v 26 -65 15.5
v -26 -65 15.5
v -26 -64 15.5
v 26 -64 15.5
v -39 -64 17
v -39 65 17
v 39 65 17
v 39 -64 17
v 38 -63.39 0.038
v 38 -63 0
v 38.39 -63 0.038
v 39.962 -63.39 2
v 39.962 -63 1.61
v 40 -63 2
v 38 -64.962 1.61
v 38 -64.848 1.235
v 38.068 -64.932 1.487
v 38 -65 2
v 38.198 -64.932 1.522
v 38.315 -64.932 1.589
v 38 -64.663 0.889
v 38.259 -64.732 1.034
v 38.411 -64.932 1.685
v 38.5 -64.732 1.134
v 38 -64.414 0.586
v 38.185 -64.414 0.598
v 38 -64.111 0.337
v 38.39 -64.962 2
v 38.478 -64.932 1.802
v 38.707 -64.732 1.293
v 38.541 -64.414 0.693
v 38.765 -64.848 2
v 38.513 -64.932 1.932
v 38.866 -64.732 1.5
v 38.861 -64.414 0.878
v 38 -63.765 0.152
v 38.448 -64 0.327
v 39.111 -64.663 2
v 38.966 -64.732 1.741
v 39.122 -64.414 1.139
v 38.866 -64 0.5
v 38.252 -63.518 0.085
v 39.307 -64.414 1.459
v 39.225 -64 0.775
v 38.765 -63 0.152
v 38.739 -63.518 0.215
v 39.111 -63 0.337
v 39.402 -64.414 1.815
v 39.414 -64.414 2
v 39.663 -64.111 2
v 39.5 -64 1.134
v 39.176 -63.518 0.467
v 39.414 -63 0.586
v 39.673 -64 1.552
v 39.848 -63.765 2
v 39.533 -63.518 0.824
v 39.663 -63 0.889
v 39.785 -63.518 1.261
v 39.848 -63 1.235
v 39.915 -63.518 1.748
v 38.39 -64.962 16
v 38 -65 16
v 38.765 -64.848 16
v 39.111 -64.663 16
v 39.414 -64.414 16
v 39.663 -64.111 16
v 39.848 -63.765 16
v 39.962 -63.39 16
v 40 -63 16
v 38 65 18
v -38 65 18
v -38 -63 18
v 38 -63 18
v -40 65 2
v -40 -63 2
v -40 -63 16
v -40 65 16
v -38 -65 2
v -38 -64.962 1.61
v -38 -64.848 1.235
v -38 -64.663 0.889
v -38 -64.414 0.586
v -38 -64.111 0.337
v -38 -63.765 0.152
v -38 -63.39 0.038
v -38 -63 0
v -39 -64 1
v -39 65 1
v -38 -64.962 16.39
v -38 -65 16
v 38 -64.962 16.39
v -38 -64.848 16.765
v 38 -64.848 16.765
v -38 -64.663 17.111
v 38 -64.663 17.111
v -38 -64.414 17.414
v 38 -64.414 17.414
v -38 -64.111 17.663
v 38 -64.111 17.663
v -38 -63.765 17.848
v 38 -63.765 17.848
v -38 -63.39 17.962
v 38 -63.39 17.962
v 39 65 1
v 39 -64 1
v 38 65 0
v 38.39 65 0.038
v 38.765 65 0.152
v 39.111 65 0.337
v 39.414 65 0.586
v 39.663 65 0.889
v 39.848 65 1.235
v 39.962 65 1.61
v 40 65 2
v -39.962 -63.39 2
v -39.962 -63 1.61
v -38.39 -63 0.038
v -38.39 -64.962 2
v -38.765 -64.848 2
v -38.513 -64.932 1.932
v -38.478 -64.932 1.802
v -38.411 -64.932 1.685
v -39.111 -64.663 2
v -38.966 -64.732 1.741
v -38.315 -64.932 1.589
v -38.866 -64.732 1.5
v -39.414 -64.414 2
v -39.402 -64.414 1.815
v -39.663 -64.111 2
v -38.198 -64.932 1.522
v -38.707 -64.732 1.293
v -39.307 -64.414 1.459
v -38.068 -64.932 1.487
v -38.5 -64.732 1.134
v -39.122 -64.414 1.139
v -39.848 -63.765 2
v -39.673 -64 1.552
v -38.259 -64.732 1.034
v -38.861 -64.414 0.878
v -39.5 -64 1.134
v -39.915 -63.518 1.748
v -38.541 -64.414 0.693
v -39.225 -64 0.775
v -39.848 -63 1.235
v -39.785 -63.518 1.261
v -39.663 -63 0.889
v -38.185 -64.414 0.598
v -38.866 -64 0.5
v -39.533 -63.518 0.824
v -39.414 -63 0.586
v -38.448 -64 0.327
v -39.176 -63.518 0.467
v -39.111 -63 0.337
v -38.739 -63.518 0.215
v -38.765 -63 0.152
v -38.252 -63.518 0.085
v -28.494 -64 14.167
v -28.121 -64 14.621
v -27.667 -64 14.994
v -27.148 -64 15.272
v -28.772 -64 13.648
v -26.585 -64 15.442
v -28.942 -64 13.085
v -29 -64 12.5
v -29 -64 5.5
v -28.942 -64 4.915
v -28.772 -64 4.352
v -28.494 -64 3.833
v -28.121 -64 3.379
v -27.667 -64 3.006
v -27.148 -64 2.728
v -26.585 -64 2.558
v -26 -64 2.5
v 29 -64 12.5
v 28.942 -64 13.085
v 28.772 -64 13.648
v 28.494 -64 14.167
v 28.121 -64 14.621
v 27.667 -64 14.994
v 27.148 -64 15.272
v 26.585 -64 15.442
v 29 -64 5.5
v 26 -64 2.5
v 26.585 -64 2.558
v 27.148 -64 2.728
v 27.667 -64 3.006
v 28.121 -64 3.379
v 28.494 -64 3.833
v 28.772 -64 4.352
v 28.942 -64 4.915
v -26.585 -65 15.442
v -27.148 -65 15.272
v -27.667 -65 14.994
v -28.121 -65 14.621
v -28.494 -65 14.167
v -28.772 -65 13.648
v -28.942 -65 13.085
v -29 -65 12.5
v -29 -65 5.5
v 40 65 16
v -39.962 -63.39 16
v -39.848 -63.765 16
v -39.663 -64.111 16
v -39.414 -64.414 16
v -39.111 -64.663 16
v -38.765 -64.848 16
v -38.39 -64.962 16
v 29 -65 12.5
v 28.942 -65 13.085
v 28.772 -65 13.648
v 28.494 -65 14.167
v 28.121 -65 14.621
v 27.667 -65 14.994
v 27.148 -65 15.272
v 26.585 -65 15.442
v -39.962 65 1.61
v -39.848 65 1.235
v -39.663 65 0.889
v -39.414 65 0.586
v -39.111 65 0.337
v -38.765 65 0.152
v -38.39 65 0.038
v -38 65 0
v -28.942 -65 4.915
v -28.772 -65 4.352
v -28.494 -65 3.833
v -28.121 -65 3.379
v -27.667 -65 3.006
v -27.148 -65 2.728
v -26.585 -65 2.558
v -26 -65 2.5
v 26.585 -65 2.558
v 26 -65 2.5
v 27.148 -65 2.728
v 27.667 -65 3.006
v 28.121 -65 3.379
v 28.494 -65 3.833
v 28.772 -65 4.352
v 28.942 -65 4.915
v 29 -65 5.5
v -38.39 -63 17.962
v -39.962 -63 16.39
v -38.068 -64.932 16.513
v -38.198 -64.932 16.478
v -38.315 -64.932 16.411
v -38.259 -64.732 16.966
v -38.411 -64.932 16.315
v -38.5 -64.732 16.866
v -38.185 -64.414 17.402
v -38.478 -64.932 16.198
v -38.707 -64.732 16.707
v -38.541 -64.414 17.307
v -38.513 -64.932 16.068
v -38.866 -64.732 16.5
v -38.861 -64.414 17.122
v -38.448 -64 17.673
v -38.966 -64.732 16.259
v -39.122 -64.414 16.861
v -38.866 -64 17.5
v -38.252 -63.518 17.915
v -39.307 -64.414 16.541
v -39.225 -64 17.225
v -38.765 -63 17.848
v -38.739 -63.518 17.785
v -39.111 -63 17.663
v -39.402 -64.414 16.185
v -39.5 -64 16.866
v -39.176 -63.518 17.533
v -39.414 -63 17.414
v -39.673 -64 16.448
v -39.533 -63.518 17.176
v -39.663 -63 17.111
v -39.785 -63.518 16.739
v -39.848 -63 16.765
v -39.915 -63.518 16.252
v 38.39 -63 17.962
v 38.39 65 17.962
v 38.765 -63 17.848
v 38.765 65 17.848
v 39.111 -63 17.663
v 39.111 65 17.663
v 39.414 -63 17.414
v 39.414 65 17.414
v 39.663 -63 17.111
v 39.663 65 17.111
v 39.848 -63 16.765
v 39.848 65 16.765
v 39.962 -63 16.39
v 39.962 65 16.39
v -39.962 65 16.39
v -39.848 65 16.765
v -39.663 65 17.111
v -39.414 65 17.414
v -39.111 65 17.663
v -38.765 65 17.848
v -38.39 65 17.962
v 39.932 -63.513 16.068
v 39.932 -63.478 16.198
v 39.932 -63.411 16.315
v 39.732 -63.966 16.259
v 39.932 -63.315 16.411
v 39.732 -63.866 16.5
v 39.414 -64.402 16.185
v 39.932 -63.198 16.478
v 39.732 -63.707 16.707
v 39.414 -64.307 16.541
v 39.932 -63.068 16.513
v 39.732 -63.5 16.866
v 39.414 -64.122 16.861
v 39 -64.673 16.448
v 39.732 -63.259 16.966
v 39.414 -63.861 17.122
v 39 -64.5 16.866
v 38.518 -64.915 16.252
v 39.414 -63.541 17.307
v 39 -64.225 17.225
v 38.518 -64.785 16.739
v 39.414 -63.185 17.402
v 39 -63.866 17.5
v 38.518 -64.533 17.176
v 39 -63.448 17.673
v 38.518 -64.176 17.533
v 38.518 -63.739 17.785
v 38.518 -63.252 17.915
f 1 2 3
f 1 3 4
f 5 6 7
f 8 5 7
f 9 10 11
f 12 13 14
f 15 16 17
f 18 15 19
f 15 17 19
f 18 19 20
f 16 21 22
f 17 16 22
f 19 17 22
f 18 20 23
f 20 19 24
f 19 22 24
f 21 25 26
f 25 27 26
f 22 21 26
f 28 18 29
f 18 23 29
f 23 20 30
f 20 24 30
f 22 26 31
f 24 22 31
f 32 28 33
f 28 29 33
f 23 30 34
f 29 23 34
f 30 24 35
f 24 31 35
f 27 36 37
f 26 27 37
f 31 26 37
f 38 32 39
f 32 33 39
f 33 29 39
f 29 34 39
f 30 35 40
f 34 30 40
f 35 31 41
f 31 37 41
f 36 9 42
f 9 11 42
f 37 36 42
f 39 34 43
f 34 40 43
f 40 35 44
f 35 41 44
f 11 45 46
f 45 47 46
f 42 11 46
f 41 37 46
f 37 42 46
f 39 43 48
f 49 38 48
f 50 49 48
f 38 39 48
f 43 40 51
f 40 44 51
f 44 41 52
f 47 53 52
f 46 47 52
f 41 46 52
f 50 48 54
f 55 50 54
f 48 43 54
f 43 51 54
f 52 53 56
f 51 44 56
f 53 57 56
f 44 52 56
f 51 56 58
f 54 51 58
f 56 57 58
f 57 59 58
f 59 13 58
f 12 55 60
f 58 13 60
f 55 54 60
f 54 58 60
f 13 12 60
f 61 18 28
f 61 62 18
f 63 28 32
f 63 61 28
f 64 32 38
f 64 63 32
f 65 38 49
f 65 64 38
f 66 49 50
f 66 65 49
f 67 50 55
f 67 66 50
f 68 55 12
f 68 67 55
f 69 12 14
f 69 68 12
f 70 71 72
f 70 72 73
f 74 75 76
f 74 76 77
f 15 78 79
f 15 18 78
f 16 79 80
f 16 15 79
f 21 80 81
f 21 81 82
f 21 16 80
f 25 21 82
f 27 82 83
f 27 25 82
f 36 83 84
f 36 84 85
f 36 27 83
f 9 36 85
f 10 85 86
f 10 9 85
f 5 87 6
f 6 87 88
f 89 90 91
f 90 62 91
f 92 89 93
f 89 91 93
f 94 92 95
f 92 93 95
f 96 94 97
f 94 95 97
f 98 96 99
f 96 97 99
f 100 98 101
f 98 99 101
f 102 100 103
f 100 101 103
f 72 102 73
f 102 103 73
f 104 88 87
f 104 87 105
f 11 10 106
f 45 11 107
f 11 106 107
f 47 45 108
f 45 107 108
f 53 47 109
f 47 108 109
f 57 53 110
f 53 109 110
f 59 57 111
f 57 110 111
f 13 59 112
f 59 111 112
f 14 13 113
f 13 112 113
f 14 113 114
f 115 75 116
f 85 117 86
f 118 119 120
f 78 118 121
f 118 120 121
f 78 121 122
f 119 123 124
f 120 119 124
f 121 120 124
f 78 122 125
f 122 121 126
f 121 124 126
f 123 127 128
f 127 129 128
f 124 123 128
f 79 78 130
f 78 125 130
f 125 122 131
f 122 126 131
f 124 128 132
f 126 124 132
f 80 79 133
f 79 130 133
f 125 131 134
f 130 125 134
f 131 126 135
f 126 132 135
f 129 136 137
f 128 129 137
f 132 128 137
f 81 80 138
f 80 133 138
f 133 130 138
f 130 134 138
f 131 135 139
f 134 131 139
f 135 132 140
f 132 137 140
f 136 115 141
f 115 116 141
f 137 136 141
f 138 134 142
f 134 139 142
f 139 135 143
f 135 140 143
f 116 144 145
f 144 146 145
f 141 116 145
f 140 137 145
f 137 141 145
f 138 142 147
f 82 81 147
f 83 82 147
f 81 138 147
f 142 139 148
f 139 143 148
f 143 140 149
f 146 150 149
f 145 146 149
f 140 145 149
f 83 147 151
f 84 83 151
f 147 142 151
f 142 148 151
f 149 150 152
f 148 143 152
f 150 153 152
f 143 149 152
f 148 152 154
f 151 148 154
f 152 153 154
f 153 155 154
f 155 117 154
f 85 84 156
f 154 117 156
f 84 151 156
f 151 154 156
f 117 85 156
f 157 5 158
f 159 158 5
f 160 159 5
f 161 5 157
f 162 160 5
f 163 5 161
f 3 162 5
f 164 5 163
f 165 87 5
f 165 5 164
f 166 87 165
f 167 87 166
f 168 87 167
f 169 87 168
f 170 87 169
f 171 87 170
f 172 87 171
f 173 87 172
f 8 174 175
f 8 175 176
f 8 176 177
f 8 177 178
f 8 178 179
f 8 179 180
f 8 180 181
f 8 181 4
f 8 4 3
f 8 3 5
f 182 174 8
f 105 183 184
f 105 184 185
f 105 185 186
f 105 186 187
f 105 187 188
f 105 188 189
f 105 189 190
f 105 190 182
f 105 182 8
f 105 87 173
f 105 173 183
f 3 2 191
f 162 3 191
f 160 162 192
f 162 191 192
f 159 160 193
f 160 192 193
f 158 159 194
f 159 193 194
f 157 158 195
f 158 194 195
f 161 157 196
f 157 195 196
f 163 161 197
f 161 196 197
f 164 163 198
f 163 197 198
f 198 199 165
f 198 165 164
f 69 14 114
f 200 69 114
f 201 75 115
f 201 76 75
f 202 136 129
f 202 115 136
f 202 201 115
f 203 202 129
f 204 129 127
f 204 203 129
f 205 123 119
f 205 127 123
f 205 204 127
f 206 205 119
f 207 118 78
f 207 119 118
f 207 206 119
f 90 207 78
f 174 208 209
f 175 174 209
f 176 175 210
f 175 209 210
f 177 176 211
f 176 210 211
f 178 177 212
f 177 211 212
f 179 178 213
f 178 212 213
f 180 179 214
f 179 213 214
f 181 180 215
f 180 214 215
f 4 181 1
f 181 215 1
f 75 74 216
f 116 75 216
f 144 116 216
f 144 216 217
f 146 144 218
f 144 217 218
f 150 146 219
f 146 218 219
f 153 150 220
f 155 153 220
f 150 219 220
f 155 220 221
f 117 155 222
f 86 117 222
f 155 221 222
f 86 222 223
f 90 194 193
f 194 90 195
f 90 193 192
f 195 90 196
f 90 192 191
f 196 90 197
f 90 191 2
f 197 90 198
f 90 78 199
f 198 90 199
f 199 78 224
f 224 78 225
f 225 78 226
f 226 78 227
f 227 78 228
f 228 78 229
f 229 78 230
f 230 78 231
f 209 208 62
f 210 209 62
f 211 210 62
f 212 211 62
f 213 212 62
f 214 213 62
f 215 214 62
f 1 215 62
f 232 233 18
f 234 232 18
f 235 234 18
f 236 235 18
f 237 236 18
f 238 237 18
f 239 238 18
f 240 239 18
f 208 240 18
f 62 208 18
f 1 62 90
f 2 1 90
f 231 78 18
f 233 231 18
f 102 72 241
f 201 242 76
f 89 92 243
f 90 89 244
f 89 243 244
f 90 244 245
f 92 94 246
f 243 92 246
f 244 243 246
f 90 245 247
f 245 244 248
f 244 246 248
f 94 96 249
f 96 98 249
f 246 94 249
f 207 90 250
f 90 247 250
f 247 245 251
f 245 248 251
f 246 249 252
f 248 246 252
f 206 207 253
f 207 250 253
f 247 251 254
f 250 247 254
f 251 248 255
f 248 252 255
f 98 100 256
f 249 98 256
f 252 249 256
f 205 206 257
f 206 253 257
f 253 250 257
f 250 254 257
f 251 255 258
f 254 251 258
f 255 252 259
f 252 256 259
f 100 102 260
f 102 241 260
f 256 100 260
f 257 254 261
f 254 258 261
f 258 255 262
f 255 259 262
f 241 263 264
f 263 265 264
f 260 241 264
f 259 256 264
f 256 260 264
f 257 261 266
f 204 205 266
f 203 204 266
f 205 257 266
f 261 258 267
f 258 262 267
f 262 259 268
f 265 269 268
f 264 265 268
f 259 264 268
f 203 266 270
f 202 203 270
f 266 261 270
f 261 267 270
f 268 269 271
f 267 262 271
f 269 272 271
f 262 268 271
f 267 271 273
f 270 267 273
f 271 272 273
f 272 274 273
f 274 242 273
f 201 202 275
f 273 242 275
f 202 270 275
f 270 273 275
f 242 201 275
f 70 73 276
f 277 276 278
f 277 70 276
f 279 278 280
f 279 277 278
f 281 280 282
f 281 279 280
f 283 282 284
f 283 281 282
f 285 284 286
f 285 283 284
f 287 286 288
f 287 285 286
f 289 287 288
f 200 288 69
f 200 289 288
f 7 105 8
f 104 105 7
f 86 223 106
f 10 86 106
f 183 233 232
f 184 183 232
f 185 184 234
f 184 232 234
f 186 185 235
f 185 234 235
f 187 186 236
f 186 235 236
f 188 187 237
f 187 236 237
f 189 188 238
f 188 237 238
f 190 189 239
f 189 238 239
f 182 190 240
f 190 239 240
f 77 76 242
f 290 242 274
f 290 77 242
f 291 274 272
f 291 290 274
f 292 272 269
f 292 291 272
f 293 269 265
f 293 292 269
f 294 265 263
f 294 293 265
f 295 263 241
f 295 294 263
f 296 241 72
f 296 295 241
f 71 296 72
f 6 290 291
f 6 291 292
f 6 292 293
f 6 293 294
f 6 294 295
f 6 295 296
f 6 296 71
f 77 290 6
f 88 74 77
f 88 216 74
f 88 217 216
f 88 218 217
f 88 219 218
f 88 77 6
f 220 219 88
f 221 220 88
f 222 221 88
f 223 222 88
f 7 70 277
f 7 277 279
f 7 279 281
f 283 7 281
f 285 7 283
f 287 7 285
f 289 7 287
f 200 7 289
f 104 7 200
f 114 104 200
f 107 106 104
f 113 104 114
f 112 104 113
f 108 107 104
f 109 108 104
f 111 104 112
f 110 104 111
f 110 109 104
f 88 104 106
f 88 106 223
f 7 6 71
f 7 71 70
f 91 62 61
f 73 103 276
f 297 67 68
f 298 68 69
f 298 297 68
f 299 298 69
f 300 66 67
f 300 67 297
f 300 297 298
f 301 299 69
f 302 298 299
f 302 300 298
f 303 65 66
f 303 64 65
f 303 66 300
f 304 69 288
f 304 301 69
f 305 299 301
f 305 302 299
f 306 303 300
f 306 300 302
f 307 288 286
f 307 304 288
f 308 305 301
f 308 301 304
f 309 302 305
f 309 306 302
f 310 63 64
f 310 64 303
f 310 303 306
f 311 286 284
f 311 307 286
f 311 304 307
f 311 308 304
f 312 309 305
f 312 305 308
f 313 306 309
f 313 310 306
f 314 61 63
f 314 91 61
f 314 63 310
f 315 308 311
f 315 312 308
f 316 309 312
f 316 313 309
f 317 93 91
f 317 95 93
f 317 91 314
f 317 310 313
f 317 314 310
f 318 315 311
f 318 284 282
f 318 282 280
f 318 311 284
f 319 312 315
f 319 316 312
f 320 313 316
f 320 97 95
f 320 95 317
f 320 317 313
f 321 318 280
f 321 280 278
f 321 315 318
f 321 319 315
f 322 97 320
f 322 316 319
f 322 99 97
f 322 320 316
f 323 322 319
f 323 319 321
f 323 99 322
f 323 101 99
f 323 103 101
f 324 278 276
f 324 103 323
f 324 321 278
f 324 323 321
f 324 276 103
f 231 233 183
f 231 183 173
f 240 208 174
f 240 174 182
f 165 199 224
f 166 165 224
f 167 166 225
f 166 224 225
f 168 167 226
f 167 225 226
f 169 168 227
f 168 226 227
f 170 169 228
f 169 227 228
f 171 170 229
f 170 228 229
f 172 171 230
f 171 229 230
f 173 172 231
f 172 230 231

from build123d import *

# Parameters (mm, degrees)
SKETCH_W     = 80
SKETCH_H     = 130
PAD_DEPTH    = 18
THICKNESS_T  = -1
POCKET_DEPTH = 130.001
FILLET_R     = 2


with BuildPart() as part:
    # Sketch → Pad (new body)
    with BuildSketch(Plane.XY):
        Rectangle(SKETCH_W, SKETCH_H)
    extrude(amount=PAD_DEPTH)

    # Thickness
    thickness_openings = [part.faces().sort_by_distance(p)[0] for p in [
        (0, 65, 9),
    ]]
    offset(amount=THICKNESS_T, openings=thickness_openings)

    # Sketch001 (on Face2 of Thickness) → Pocket (cut, through all)
    with BuildSketch(Plane.XZ.offset(65)):
        with BuildLine():
            Line((-26, 15.5), (26, 15.5))
            ThreePointArc((29, 12.5), (28.12132, 14.62132), (26, 15.5))
            Line((29, 12.5), (29, 5.5))
            ThreePointArc((26, 2.5), (28.12132, 3.37868), (29, 5.5))
            Line((26, 2.5), (-26, 2.5))
            ThreePointArc((-29, 5.5), (-28.12132, 3.37868), (-26, 2.5))
            Line((-29, 5.5), (-29, 12.5))
            ThreePointArc((-26, 15.5), (-28.12132, 14.62132), (-29, 12.5))
        make_face()
    extrude(amount=-POCKET_DEPTH, mode=Mode.SUBTRACT)

    # Fillet
    fillet_edges = [part.edges().sort_by_distance(p)[0] for p in [
        (-40, 0, 0),
        (40, 0, 0),
        (-40, 0, 18),
        (0, -65, 18),
        (-40, -65, 9),
        (0, -65, 0),
        (40, -65, 9),
        (40, 0, 18),
    ]]
    fillet(fillet_edges, radius=FILLET_R)


solid = part.part
